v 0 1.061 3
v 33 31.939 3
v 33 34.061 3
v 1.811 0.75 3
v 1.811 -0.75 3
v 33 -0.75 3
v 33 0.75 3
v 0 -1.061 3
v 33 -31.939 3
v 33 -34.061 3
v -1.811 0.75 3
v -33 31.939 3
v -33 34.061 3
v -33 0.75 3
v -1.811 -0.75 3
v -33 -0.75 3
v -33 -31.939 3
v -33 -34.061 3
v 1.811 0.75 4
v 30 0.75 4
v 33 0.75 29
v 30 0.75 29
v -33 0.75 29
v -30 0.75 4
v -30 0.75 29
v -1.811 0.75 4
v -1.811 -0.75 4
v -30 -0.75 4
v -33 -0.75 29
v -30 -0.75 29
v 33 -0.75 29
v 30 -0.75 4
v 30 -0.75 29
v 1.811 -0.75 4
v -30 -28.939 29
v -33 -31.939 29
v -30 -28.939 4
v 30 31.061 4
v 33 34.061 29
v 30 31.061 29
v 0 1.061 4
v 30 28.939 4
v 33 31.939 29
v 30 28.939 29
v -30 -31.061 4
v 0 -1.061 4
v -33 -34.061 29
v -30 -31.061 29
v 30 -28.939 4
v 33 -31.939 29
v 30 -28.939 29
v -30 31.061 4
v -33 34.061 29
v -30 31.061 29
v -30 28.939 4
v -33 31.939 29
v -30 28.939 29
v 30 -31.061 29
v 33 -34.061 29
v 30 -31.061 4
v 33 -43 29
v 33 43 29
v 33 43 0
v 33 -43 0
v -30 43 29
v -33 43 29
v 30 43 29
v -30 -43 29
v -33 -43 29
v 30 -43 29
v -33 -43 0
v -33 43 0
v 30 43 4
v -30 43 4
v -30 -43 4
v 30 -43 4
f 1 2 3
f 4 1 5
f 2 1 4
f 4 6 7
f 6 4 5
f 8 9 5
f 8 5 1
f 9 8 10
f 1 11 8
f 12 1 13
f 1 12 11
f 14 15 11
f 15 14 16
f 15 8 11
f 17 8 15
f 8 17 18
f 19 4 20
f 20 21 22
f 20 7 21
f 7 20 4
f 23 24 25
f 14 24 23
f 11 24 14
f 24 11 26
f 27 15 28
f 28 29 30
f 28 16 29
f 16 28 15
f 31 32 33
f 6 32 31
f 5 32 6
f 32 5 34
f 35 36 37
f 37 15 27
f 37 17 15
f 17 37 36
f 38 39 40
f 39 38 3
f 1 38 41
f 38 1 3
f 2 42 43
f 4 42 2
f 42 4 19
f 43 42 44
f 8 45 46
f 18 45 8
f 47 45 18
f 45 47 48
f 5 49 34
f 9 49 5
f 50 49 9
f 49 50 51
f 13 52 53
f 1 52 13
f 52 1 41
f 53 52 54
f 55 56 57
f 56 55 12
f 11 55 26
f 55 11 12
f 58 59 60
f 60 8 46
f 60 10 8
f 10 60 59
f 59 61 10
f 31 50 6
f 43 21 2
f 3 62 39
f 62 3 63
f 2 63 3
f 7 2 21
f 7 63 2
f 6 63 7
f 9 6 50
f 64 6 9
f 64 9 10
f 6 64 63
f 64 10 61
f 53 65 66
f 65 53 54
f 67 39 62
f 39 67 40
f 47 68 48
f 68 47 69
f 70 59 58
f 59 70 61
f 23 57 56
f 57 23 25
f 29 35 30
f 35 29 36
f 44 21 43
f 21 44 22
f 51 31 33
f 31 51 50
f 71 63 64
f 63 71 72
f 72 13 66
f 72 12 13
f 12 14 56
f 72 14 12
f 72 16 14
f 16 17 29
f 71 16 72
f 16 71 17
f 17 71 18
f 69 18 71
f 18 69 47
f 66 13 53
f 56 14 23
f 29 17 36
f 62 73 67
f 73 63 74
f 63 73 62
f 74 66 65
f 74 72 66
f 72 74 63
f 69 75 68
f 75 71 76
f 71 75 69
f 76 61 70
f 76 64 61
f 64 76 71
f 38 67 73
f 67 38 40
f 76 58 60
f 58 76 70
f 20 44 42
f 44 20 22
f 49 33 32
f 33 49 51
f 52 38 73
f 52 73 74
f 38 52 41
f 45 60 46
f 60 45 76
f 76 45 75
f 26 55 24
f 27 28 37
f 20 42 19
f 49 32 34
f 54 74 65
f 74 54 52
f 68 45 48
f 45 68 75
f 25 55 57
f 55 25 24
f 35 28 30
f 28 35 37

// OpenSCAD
//=============================================================================
// miter-box.scad
//
// A simple tray for storing tealights, keeping them from rolling around.
//=============================================================================
// Written in 2017 by Patrick Barrett
//
// To the extent possible under law, the author(s) have dedicated all copyright
// and related and neighboring rights to this work to the public domain
// worldwide. This work is distributed without any warranty.
//
// See <http://creativecommons.org/publicdomain/zero/1.0/> for full dedication.
//=============================================================================

width = 60; // mm, internal
length = 80; // mm, internal
height = 25; // mm, internal

slot = 1.5; // mm, internal
slot_angles = [0 ,45]; // deg, automatically mirrored

wall = 3; // mm, the side thickness
base = 3; // mm, the bottom thickness
base_cut = 1; // mm, the extra cutting space at the bottom

// customizable variables end here

tw = width + (wall * 2);
tl = length + (wall * 2);
th = height + base + base_cut;
tb = base + base_cut;

abit = 0.0001; //use for making overlap to get single manifold stl
alot = 1500;

// main body
difference() {
    translate([0,0,th/2])
    cube([tw, tl, th], center=true);
    
    translate([0, 0, alot/2 + tb])
    cube([width, alot, alot], center=true);
    
    for(i = slot_angles) {
        rotate([0,0,i])
        translate([0, 0, alot/2 + base])
        cube([alot, slot, alot], center=true);
        
        rotate([0,0,-i])
        translate([0, 0, alot/2 + base])
        cube([alot, slot, alot], center=true);
    }
}
